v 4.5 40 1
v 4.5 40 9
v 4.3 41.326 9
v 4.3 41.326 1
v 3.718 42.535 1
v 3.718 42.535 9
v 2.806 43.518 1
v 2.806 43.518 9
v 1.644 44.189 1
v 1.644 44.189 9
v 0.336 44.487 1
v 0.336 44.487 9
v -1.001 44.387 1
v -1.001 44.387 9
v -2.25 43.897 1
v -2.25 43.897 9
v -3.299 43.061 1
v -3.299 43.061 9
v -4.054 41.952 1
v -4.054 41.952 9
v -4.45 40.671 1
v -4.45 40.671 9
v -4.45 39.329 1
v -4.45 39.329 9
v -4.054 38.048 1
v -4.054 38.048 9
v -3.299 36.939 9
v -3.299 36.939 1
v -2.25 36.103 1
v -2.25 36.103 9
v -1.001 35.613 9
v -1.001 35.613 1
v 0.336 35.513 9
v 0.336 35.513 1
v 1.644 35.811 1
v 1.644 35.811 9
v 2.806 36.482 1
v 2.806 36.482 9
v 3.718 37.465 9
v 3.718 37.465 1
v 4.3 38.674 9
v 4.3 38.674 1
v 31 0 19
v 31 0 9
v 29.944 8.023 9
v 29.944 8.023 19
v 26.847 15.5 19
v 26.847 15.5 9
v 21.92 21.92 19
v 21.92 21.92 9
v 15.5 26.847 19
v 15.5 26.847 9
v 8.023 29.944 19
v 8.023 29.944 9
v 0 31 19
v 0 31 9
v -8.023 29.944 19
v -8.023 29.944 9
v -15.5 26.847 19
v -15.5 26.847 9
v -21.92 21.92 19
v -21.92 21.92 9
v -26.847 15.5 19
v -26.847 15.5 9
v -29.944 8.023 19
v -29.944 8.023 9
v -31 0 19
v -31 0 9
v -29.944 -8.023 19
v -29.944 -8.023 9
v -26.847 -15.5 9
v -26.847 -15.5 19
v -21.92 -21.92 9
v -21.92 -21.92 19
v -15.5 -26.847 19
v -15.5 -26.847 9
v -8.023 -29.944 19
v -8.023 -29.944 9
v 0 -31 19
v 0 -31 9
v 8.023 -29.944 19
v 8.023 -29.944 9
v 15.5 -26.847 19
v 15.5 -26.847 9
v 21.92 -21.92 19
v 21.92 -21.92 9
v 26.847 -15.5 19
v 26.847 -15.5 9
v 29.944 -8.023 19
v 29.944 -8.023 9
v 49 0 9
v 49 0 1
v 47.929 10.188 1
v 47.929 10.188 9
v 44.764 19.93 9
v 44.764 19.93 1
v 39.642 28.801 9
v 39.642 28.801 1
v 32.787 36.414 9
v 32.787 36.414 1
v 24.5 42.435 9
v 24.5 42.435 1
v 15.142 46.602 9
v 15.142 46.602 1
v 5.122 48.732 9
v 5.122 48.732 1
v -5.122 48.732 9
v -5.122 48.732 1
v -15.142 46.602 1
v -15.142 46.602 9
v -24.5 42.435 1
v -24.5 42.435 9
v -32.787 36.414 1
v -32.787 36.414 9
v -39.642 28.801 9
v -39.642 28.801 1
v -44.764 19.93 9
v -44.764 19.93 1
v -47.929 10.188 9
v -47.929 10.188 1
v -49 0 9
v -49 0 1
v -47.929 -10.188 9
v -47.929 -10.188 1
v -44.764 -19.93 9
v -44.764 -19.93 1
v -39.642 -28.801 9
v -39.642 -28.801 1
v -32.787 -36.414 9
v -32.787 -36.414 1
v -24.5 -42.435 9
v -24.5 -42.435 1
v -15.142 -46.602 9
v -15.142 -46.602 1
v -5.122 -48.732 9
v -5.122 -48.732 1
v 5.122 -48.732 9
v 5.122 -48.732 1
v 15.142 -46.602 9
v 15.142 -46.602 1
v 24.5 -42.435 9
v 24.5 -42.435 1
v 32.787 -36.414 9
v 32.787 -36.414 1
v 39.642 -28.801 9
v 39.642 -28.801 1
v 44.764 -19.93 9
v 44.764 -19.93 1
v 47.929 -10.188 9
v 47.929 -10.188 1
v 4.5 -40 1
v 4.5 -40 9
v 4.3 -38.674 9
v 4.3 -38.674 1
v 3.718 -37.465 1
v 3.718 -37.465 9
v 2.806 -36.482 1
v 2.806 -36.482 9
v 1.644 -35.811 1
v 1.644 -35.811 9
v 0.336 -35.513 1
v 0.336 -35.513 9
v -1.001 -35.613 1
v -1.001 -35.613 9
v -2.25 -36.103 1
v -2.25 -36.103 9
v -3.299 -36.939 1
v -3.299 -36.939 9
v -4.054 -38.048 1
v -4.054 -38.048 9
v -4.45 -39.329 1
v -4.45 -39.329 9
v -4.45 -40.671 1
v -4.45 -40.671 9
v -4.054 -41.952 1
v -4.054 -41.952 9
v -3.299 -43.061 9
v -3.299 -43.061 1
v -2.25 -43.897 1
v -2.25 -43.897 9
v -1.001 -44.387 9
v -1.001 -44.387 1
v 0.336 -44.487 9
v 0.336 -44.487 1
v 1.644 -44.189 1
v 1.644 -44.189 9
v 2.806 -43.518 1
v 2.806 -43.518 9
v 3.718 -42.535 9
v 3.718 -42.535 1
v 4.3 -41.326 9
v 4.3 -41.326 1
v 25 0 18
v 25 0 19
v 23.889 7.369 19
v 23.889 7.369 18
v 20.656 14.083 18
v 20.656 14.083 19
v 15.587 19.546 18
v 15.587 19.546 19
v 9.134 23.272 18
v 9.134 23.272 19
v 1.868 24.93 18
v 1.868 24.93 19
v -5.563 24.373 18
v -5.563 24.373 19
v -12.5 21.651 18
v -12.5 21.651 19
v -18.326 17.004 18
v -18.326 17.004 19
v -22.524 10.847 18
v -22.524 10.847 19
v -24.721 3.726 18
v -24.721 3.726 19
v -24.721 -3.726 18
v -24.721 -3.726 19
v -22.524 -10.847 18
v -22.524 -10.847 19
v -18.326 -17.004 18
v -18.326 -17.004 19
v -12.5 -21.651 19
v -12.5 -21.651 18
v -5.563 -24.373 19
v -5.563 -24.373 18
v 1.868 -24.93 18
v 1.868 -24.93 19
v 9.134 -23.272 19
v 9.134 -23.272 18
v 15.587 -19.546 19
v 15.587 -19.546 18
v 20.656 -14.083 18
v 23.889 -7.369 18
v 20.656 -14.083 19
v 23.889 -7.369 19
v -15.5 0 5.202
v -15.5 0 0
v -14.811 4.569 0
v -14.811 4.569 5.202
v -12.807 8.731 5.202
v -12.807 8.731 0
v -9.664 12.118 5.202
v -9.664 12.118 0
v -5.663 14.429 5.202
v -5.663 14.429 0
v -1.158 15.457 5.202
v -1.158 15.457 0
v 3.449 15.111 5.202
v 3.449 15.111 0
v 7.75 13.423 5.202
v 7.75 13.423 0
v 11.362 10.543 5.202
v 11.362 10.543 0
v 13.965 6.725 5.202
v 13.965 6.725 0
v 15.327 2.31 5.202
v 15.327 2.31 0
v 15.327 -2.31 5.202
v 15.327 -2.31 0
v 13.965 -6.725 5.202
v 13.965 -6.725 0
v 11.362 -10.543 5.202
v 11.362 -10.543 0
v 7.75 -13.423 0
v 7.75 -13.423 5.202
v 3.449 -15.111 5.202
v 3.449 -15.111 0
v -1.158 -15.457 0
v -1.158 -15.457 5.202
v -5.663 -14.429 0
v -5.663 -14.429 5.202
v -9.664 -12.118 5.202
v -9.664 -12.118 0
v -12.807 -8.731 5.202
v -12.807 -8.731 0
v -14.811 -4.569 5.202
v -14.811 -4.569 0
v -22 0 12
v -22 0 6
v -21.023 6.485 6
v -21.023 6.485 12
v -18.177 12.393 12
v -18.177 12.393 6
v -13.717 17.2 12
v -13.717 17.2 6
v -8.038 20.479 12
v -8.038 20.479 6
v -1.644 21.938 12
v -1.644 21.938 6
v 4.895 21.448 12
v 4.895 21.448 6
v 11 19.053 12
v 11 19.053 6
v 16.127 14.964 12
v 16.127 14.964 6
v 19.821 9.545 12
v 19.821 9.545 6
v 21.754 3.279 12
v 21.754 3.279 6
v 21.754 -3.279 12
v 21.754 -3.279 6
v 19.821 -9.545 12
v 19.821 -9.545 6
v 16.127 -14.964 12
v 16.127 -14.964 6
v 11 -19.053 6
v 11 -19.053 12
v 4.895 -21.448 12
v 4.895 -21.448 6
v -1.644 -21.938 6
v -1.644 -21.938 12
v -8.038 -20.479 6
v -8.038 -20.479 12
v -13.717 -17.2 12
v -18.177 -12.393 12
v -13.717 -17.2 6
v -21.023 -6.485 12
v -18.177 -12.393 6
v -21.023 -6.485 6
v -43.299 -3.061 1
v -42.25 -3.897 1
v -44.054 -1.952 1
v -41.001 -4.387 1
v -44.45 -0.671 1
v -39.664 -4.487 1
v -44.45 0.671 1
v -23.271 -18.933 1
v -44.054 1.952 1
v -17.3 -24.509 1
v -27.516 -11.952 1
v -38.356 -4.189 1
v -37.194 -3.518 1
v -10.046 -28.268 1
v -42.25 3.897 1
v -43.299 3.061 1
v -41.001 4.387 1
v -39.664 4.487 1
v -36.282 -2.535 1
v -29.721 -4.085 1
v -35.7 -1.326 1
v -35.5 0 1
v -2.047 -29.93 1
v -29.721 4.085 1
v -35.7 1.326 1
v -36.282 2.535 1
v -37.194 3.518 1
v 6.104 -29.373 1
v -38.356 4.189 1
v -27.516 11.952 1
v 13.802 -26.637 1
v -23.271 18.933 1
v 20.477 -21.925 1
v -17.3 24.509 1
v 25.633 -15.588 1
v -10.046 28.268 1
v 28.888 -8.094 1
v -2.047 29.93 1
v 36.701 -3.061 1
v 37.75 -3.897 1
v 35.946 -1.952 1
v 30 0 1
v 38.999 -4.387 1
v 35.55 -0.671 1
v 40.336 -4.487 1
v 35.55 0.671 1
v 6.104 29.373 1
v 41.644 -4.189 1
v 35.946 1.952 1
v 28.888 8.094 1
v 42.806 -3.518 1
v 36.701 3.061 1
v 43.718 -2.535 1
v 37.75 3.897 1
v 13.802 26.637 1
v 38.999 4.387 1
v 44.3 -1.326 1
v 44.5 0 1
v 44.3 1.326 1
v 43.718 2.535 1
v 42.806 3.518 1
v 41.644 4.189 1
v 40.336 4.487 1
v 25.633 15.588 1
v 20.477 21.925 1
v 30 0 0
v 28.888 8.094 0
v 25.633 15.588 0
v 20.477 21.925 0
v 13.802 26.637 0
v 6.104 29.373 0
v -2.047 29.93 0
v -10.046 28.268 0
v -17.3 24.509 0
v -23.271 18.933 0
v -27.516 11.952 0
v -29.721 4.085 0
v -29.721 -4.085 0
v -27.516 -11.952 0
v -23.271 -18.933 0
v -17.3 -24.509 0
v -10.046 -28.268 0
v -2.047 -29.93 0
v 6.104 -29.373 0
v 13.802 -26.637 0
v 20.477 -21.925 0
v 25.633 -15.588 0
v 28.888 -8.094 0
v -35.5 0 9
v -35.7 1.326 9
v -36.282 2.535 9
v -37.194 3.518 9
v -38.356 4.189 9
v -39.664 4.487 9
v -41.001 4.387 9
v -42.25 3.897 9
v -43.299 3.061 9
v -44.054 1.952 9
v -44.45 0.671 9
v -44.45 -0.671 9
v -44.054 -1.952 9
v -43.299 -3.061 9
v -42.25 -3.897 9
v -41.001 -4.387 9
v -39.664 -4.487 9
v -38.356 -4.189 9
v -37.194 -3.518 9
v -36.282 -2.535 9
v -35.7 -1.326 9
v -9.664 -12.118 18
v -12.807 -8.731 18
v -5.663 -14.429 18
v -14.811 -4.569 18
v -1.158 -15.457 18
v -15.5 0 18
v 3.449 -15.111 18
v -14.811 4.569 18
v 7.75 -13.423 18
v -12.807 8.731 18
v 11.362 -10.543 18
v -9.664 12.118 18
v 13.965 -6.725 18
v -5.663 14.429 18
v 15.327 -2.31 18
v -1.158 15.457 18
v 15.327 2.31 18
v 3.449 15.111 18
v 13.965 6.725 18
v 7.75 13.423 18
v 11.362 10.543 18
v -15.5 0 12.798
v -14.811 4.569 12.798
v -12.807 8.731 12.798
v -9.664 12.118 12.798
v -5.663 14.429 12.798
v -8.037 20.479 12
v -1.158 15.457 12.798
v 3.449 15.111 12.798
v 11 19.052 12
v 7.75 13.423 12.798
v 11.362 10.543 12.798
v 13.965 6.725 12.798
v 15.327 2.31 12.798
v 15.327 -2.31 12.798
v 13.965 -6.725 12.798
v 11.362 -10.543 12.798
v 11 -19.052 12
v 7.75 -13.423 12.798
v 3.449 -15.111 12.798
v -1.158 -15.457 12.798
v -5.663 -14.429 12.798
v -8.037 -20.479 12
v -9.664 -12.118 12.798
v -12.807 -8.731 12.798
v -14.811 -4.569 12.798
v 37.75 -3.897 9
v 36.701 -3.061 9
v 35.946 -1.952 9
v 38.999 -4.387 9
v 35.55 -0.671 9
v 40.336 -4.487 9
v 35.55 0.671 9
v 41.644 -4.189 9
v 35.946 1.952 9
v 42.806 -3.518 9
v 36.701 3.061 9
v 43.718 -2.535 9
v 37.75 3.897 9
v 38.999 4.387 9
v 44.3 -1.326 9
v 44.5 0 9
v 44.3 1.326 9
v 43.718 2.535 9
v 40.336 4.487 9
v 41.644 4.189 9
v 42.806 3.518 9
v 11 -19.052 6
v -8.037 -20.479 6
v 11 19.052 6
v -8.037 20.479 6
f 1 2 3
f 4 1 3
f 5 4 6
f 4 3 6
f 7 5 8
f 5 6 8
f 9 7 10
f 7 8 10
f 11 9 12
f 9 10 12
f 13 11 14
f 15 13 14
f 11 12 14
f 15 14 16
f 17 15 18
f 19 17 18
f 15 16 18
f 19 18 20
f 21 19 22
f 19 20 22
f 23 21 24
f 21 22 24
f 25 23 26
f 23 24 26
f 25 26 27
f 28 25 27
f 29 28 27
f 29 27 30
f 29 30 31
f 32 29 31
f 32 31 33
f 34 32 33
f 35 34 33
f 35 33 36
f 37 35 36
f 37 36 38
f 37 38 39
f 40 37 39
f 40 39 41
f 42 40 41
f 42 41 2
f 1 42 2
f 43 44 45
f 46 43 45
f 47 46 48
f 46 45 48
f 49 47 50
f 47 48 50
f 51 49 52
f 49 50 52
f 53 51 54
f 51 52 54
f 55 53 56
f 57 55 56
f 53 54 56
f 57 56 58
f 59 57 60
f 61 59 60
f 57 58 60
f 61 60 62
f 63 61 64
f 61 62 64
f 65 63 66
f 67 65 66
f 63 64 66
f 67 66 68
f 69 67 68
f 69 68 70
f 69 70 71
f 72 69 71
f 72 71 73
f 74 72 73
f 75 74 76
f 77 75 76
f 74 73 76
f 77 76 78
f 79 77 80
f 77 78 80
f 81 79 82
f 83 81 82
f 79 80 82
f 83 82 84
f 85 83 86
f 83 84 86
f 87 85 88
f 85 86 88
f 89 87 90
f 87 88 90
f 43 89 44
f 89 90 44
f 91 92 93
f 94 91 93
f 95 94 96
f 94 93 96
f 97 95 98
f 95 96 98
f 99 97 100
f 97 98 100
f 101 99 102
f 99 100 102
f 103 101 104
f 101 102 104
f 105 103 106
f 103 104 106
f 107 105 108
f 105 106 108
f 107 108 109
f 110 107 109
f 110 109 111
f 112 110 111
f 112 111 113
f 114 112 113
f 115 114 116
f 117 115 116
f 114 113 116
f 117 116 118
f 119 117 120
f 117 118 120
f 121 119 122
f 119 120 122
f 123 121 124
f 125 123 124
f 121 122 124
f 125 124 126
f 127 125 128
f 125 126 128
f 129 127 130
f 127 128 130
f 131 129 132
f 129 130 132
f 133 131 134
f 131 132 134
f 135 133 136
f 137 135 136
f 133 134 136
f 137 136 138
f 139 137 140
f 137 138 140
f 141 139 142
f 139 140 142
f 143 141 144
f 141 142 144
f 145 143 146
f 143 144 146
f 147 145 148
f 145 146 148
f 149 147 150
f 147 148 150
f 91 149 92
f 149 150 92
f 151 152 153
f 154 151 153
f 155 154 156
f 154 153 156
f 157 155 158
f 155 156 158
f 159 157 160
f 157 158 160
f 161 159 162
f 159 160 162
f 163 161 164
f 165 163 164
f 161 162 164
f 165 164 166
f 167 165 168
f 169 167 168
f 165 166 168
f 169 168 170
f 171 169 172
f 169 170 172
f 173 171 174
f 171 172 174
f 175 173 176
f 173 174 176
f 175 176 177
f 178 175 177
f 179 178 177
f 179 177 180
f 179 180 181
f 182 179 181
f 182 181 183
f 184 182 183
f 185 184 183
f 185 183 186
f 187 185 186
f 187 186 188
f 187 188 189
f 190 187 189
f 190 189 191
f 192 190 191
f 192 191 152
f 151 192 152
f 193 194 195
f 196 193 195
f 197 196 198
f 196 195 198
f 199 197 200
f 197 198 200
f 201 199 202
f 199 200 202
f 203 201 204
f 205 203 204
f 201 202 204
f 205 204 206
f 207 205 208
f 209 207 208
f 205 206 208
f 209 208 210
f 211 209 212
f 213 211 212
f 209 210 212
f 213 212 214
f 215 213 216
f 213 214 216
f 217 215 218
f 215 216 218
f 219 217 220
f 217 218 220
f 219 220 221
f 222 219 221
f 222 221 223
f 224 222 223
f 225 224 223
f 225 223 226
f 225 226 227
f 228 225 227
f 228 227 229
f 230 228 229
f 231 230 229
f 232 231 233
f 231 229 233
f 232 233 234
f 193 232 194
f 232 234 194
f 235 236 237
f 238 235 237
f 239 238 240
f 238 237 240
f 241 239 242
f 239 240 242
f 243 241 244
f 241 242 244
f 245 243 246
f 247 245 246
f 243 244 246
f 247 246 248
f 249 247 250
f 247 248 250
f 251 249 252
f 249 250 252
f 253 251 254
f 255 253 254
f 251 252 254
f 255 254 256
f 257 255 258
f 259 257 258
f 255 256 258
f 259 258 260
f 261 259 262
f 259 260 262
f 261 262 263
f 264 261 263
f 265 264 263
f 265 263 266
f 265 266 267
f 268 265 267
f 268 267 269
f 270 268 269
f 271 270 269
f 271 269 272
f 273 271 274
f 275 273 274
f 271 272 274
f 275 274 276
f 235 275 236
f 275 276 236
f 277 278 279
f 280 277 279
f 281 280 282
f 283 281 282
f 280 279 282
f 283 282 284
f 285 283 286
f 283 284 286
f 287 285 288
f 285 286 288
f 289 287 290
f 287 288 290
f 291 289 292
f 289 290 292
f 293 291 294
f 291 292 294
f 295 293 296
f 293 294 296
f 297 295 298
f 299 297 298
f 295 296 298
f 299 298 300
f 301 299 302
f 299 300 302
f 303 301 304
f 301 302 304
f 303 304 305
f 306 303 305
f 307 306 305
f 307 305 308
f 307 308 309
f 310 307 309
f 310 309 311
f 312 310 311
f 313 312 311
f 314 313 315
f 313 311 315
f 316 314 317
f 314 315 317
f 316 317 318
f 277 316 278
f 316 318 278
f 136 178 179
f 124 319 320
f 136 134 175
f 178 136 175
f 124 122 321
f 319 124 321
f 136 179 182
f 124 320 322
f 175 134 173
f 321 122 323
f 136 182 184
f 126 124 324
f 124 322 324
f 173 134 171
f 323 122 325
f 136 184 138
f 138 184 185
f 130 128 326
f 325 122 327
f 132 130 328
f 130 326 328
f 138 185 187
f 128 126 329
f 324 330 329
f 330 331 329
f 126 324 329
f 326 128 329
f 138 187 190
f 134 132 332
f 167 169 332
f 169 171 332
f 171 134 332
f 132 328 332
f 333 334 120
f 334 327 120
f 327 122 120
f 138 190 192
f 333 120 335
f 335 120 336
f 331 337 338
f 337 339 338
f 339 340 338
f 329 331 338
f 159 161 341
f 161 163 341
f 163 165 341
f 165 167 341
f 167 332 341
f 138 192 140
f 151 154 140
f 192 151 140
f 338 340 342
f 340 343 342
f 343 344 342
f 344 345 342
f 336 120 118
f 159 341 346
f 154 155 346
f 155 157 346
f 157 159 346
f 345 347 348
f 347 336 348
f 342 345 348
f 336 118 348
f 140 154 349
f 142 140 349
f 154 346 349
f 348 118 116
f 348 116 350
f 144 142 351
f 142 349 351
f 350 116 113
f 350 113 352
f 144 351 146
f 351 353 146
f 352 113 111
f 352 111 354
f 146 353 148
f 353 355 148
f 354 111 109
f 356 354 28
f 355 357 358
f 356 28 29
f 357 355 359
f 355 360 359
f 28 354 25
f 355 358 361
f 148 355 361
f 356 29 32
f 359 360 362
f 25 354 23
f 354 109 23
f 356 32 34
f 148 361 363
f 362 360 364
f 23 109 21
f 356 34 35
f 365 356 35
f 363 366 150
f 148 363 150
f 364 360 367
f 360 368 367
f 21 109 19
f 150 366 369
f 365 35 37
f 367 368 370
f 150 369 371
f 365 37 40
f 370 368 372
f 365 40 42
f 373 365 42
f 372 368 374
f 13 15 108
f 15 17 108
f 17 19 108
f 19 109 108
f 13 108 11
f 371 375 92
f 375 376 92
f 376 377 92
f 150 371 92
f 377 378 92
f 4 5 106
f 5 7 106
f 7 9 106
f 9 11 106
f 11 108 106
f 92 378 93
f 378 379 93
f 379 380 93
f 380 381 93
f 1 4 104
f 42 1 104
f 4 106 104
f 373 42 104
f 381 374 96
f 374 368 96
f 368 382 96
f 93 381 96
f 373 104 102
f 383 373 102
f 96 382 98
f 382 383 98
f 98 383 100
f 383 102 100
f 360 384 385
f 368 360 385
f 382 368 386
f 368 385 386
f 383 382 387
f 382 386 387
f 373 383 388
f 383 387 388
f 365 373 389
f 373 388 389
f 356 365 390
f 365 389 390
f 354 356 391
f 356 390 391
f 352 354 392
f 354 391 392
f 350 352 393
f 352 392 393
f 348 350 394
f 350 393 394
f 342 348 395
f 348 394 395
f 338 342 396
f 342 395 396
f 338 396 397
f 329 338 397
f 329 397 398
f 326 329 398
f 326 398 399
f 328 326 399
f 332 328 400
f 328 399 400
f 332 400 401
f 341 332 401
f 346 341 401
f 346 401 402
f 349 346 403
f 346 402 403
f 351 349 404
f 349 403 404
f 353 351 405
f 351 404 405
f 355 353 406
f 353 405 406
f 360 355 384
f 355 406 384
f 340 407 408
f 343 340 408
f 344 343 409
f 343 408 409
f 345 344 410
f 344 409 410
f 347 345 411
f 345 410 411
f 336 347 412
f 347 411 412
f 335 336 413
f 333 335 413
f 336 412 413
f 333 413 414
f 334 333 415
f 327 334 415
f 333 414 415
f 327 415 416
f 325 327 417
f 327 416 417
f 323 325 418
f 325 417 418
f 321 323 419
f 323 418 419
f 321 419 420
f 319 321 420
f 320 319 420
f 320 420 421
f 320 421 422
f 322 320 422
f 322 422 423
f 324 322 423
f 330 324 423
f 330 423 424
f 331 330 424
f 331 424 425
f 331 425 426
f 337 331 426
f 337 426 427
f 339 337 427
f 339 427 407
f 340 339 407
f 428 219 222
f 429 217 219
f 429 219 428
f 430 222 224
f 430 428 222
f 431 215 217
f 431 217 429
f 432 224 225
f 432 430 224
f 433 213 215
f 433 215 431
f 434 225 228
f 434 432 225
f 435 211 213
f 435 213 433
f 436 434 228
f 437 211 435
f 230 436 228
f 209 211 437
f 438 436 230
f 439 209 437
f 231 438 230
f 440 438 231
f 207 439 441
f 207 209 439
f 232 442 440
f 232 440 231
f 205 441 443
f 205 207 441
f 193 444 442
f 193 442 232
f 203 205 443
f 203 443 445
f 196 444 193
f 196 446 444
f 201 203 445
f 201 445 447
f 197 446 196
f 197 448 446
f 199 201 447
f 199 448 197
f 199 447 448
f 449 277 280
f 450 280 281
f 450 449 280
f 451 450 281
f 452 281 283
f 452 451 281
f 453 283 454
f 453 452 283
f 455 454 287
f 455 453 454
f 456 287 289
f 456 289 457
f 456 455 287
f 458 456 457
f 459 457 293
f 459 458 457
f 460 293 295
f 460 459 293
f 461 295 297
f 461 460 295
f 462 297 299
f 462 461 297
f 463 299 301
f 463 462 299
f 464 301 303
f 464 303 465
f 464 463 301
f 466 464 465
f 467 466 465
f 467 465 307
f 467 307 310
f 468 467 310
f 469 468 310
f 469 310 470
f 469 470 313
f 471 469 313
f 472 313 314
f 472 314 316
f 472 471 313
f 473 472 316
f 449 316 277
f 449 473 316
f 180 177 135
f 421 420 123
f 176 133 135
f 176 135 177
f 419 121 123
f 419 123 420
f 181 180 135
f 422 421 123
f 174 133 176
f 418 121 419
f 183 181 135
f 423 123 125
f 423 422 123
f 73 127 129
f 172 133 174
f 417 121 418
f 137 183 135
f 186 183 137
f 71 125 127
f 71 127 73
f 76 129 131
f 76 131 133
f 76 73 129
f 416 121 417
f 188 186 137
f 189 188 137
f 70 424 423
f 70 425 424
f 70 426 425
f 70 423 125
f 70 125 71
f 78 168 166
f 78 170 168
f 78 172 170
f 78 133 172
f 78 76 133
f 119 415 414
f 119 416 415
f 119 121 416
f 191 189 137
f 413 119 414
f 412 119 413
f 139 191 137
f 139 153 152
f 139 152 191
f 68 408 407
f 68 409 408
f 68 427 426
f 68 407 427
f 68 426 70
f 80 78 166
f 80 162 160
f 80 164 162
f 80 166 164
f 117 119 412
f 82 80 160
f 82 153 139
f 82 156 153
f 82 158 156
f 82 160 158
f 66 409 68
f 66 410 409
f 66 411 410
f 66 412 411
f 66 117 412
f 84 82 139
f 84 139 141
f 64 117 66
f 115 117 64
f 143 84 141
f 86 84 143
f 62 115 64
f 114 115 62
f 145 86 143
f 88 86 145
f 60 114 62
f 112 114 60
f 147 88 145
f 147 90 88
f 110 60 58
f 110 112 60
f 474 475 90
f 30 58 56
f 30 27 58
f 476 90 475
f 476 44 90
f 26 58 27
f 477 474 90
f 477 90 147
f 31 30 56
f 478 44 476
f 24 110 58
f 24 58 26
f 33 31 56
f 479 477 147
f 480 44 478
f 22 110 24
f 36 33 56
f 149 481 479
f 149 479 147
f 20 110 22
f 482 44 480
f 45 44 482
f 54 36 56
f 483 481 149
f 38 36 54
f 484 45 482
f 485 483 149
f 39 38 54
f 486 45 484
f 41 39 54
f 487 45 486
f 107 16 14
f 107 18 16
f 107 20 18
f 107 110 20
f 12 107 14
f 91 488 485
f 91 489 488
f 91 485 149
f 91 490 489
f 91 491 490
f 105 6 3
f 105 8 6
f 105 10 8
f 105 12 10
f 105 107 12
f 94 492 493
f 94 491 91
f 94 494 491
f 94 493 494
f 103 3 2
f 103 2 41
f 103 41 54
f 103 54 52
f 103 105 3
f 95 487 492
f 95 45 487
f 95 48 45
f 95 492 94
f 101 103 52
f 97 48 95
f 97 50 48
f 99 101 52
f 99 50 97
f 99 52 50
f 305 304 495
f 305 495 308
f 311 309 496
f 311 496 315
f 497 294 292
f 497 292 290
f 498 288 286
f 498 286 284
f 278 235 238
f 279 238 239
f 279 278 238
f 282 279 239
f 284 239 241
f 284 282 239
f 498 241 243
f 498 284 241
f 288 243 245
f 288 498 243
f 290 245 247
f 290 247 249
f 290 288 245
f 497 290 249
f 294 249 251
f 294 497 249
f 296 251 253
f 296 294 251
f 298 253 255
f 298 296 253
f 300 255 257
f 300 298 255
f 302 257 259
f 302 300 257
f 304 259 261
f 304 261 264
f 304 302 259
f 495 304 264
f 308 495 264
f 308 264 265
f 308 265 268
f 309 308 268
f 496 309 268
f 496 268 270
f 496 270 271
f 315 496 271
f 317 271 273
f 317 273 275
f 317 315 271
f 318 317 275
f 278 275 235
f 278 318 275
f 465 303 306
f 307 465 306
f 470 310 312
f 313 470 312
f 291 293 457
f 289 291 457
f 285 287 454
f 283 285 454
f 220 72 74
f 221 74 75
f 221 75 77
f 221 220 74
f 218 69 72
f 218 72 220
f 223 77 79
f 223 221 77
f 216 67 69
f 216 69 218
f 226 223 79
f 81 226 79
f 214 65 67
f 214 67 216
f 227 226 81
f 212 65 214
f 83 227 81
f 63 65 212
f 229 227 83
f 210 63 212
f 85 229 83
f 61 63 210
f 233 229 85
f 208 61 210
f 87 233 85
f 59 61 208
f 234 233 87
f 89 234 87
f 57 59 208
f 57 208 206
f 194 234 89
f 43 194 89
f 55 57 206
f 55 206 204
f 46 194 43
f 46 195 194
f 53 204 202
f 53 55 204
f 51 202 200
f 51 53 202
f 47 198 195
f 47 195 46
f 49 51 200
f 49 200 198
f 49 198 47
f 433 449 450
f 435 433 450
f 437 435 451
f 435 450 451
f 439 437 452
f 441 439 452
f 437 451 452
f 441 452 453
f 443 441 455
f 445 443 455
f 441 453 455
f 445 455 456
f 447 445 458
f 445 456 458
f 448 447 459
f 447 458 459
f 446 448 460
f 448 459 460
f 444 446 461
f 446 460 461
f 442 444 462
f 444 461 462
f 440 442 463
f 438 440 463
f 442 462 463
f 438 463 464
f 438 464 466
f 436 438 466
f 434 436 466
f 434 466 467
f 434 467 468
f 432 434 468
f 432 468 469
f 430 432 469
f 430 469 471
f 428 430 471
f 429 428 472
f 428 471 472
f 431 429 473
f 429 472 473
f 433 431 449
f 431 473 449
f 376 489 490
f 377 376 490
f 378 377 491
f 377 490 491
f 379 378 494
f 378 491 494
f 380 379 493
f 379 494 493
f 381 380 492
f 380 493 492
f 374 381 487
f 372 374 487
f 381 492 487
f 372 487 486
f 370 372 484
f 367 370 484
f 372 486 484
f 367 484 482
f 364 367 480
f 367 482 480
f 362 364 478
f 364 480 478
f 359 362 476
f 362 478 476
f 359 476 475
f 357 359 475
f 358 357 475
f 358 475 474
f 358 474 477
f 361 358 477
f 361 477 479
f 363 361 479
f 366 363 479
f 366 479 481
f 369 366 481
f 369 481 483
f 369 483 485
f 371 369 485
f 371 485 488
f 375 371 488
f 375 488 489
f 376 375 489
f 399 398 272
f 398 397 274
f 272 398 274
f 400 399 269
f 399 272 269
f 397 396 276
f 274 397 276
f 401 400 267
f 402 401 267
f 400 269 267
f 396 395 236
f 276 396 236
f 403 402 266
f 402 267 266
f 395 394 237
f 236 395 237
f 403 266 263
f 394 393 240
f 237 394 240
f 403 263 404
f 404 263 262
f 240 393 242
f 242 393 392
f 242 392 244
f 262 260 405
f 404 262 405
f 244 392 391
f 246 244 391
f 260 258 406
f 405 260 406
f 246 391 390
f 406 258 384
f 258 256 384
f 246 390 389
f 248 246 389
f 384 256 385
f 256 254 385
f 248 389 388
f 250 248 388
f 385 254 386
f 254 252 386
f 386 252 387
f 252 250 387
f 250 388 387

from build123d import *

# Parameters (mm, degrees)
SKETCH_1_R          = 30
EXTRUDE_1_DEPTH     = 1
SKETCH_2_R          = 49
EXTRUDE_2_DEPTH     = 8
SKETCH_3_R          = 31
EXTRUDE_3_DEPTH     = 10
SKETCH_4_R          = 25
CUT_EXTRUDE_1_DEPTH = 1
SKETCH_5_R          = 15.5
CUT_EXTRUDE_2_DEPTH = 6
SKETCH_6_R          = 22
CUT_EXTRUDE_3_DEPTH = 6
SKETCH_7_R          = 15.5
CUT_EXTRUDE_4_DEPTH = 6
CHAMFER_1_SIZE2     = 6.5
CHAMFER_1_SIZE      = 0.798099646
CHAMFER_2_SIZE2     = 0.798099646
CHAMFER_2_SIZE      = 6.5
SKETCH_8_R          = 4.5
CUT_EXTRUDE_5_DEPTH = 10


with BuildPart() as part:
    # 草图1 → 凸台-拉伸1 (new body)
    with BuildSketch(Plane.XY):
        Circle(SKETCH_1_R)
    extrude(amount=EXTRUDE_1_DEPTH)

    # 草图2 → 凸台-拉伸2 (add)
    with BuildSketch(Plane.XY.offset(1)):
        Circle(SKETCH_2_R)
    extrude(amount=EXTRUDE_2_DEPTH)

    # 草图3 → 凸台-拉伸3 (add)
    with BuildSketch(Plane.XY.offset(9)):
        Circle(SKETCH_3_R)
    extrude(amount=EXTRUDE_3_DEPTH)

    # 草图4 → 切除-拉伸1 (cut)
    with BuildSketch(Plane.XY.offset(19)):
        Circle(SKETCH_4_R)
    extrude(amount=-CUT_EXTRUDE_1_DEPTH, mode=Mode.SUBTRACT)

    # 草图5 → 切除-拉伸2 (cut)
    with BuildSketch(Plane(origin=(0, 0, 0), x_dir=(-1, 0, 0), z_dir=(0, 0, -1))):
        Circle(SKETCH_5_R)
    extrude(amount=-CUT_EXTRUDE_2_DEPTH, mode=Mode.SUBTRACT)

    # 草图6 → 切除-拉伸3 (cut)
    with BuildSketch(Plane(origin=(0, 0, 6), x_dir=(-1, 0, 0), z_dir=(0, 0, -1))):
        Circle(SKETCH_6_R)
    extrude(amount=-CUT_EXTRUDE_3_DEPTH, mode=Mode.SUBTRACT)

    # 草图7 → 切除-拉伸4 (cut)
    with BuildSketch(Plane(origin=(0, 0, 12), x_dir=(-1, 0, 0), z_dir=(0, 0, -1))):
        Circle(SKETCH_7_R)
    extrude(amount=-CUT_EXTRUDE_4_DEPTH, mode=Mode.SUBTRACT)

    # 倒角1
    chamfer_1_edges = [part.edges().sort_by_distance(p)[0] for p in [
        (15.5, 0, 6),
    ]]
    chamfer_1_side = [part.faces().sort_by_distance(p)[0] for p in [
        (15.5, 0, 5.984038007),
    ]]
    chamfer(chamfer_1_edges, length=CHAMFER_1_SIZE - 0.0001, length2=CHAMFER_1_SIZE2 - 0.0001, reference=chamfer_1_side[0])  # a hair under: the kernel refuses the full size

    # 倒角2
    chamfer_2_edges = [part.edges().sort_by_distance(p)[0] for p in [
        (15.5, 0, 12),
    ]]
    chamfer_2_side = [part.faces().sort_by_distance(p)[0] for p in [
        (15.515961993, 0, 12),
    ]]
    chamfer(chamfer_2_edges, length=CHAMFER_2_SIZE - 0.0001, length2=CHAMFER_2_SIZE2 - 0.0001, reference=chamfer_2_side[0])  # a hair under: the kernel refuses the full size

    # 草图8 → 切除-拉伸5 (cut)
    with BuildSketch(Plane.XY.offset(9)):
        with Locations((0, 40)):
            Circle(SKETCH_8_R)
        with Locations((40, 0)):
            Circle(SKETCH_8_R)
        with Locations((0, -40)):
            Circle(SKETCH_8_R)
        with Locations((-40, 0)):
            Circle(SKETCH_8_R)
    extrude(amount=-CUT_EXTRUDE_5_DEPTH, mode=Mode.SUBTRACT)


solid = part.part
